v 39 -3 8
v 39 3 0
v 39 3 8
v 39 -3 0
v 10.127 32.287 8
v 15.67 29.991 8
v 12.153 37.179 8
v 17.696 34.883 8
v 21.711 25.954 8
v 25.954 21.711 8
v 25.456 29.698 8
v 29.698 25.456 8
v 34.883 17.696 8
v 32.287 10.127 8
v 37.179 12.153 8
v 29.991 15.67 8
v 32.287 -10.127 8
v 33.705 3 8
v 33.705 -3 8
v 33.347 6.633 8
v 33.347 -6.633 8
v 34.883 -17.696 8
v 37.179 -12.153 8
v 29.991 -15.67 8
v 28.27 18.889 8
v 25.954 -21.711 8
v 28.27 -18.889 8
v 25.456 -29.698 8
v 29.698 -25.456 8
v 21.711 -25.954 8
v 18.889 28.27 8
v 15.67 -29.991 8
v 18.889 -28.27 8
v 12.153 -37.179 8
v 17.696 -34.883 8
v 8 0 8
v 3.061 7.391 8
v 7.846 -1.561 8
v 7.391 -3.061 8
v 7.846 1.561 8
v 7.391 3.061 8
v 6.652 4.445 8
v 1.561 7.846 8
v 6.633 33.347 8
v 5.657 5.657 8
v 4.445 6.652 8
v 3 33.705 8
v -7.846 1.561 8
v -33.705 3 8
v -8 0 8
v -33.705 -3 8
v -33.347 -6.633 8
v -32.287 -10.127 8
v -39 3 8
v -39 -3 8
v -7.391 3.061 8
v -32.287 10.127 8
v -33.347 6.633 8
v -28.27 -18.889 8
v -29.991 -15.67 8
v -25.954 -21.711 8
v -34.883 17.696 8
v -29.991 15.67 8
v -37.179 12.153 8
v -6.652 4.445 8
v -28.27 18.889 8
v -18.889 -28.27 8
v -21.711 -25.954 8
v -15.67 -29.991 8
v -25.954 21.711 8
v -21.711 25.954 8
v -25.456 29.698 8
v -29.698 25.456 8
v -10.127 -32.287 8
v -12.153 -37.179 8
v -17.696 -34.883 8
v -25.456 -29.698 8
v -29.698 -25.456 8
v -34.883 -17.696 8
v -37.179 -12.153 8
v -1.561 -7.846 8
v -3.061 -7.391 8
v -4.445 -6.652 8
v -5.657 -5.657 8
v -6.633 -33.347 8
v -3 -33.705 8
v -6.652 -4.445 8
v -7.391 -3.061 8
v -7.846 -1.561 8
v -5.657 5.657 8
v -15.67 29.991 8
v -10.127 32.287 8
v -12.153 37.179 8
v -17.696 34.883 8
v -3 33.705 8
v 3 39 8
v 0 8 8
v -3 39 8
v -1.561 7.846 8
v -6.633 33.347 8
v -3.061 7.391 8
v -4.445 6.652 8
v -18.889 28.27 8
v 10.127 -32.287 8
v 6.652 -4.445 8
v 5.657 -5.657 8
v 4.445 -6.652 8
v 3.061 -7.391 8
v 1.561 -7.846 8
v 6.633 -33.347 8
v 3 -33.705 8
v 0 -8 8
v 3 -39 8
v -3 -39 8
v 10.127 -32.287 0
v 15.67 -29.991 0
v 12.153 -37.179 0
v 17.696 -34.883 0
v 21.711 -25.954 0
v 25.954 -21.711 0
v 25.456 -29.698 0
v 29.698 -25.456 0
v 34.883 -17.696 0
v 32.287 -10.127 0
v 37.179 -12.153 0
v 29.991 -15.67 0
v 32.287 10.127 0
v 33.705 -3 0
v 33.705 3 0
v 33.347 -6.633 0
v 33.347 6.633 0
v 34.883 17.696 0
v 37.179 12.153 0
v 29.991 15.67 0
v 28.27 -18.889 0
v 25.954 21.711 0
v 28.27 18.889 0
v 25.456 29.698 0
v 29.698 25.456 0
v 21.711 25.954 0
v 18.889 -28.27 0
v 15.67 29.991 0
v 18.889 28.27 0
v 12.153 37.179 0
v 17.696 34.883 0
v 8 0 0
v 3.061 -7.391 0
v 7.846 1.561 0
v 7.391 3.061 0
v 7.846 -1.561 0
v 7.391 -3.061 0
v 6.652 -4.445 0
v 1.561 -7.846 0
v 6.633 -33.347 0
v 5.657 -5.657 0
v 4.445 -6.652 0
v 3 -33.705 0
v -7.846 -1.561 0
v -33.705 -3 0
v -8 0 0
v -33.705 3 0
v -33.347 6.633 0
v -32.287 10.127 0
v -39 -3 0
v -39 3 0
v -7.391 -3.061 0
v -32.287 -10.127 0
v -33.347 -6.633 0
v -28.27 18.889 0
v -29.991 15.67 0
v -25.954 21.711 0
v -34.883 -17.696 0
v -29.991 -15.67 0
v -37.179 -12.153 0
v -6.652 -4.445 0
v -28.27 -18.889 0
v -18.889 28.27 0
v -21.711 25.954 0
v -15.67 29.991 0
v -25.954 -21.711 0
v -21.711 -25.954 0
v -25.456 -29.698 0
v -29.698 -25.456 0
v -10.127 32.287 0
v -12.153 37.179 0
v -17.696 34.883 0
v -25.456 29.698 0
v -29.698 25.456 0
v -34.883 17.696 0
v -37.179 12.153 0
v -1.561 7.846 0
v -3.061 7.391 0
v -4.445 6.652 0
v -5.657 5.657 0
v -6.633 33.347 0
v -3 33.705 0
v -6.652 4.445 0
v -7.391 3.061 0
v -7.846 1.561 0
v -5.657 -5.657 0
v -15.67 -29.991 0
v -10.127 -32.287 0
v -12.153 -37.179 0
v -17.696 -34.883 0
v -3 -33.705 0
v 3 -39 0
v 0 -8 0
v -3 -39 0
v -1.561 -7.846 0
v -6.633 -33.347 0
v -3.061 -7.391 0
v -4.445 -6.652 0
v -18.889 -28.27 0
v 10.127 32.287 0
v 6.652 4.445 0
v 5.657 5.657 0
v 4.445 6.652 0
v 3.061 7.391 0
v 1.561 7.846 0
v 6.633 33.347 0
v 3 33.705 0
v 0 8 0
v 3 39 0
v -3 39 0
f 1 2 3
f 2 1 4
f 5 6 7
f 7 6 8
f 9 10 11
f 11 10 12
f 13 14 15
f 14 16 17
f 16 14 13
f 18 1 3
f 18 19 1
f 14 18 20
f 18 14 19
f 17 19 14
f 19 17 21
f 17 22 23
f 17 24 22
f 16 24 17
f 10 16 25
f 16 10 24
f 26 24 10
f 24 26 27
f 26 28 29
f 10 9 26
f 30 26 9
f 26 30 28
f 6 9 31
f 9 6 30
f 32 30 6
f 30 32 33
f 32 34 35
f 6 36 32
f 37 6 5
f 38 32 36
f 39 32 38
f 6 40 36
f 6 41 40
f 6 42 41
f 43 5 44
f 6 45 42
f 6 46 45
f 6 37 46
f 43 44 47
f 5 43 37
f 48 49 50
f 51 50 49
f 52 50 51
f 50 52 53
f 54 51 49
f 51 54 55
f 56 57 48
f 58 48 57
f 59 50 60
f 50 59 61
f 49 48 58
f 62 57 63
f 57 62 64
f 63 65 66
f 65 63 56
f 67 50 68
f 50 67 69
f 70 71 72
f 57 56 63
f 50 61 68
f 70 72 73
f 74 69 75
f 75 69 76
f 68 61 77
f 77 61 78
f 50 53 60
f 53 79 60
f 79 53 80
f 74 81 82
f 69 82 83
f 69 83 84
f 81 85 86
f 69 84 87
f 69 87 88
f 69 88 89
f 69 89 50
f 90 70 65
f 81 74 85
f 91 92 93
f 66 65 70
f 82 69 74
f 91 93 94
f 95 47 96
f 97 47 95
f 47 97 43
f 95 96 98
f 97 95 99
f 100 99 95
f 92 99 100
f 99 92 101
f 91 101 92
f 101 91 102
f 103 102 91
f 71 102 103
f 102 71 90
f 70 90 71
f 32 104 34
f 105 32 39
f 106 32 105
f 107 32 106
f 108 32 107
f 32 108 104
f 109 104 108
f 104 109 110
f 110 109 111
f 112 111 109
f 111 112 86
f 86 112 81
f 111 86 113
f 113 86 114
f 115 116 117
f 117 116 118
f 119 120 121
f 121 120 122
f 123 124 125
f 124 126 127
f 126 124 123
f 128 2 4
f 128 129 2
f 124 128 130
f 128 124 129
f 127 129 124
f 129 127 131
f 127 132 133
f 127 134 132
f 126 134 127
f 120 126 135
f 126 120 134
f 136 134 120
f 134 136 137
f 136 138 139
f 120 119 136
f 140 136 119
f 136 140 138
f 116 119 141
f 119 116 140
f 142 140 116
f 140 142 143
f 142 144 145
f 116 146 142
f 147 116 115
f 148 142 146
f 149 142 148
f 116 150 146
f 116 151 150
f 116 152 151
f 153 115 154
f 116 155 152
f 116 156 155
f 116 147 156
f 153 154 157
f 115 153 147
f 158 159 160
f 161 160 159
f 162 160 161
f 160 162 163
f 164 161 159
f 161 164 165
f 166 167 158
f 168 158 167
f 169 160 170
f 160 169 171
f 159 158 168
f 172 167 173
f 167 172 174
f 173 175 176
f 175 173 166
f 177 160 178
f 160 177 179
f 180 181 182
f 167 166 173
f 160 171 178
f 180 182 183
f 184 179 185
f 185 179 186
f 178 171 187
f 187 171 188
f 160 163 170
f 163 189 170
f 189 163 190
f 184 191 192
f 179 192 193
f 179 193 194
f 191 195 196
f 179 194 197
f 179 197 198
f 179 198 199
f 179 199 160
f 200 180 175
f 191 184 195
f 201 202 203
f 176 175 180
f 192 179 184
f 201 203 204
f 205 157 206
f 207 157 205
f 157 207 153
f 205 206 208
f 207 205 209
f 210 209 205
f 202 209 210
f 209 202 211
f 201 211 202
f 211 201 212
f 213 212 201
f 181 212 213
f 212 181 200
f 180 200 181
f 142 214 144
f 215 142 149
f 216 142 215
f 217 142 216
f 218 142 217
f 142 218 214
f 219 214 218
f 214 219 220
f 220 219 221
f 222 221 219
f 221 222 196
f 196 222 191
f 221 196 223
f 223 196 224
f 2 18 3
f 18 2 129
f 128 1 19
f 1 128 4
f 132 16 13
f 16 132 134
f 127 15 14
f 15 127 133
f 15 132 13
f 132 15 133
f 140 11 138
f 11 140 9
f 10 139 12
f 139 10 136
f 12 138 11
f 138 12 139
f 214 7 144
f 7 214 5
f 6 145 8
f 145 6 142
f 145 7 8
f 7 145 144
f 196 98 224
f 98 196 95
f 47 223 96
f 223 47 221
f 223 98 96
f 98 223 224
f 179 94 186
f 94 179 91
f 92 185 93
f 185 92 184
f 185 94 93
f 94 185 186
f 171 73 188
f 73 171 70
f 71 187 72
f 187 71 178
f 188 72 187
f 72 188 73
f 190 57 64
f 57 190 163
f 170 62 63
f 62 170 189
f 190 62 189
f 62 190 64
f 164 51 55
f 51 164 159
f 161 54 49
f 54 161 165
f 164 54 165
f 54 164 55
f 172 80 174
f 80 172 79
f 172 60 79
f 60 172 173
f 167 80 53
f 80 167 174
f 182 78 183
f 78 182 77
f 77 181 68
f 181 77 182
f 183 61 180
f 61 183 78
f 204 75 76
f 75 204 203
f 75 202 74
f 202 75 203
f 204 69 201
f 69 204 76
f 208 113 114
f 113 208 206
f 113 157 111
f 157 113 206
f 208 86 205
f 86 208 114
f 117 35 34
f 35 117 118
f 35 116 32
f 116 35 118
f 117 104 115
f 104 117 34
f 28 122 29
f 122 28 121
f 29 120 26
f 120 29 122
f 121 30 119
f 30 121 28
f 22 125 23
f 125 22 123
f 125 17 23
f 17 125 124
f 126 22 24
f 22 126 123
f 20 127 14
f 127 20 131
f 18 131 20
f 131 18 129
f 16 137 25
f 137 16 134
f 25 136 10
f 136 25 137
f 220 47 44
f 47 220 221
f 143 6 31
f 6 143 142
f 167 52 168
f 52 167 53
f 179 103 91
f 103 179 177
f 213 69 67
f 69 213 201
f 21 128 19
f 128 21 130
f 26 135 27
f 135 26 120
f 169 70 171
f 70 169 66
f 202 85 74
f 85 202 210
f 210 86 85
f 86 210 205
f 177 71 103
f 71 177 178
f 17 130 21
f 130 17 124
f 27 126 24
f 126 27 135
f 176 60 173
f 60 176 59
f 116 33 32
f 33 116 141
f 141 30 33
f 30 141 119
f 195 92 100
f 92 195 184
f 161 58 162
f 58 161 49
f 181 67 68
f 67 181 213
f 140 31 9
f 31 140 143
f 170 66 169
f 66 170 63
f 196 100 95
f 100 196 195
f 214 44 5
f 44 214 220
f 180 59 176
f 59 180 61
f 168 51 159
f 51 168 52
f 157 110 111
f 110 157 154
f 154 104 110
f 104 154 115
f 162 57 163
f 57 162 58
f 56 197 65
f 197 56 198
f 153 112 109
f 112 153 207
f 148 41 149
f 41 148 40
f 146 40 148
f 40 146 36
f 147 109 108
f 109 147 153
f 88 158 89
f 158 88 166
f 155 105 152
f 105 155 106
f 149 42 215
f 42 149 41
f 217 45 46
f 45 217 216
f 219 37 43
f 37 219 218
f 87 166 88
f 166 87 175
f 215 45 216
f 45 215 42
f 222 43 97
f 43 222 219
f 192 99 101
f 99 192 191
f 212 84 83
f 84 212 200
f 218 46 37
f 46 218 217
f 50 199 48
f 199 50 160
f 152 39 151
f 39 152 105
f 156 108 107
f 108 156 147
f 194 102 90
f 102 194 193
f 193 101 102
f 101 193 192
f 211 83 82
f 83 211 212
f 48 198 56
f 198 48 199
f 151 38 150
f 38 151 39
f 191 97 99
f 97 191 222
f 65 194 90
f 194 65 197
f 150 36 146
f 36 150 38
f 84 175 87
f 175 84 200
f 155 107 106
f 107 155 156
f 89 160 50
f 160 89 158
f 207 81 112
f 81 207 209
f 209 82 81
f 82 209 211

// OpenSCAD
$fn = 32;

// ----------------------------------------------------------------------
// Spur blank: bored gear blank
// ----------------------------------------------------------------------

// --- parameters (mm) ---
disc_r = 34;              // blank root radius
disc_t = 8;               // blank thickness
n_teeth = 16;             // stub tooth count
tooth_w = 6;              // tooth width at the root
tooth_h = 5;              // tooth height above the root
bore_r = 8;               // central bore radius
fit_tol = 0.05;           // tolerance for press fits, mm
free_tol = 0.2;           // tolerance for clearance fits, mm

out_r = disc_r + tooth_h;  // tip radius
bbox_x = 78.0;  // measured width over the teeth
bbox_y = 78.0;  // measured depth over the teeth

difference() {
union() {
  cylinder(r = disc_r, h = disc_t);
  for (i = [0 : n_teeth - 1])
    rotate([0, 0, i * 360 / n_teeth])
      translate([disc_r - 1, -tooth_w / 2, 0])
        cube([tooth_h + 1, tooth_w, disc_t]);
}
  translate([0, 0, -1]) cylinder(r = bore_r, h = disc_t + 2);
}
